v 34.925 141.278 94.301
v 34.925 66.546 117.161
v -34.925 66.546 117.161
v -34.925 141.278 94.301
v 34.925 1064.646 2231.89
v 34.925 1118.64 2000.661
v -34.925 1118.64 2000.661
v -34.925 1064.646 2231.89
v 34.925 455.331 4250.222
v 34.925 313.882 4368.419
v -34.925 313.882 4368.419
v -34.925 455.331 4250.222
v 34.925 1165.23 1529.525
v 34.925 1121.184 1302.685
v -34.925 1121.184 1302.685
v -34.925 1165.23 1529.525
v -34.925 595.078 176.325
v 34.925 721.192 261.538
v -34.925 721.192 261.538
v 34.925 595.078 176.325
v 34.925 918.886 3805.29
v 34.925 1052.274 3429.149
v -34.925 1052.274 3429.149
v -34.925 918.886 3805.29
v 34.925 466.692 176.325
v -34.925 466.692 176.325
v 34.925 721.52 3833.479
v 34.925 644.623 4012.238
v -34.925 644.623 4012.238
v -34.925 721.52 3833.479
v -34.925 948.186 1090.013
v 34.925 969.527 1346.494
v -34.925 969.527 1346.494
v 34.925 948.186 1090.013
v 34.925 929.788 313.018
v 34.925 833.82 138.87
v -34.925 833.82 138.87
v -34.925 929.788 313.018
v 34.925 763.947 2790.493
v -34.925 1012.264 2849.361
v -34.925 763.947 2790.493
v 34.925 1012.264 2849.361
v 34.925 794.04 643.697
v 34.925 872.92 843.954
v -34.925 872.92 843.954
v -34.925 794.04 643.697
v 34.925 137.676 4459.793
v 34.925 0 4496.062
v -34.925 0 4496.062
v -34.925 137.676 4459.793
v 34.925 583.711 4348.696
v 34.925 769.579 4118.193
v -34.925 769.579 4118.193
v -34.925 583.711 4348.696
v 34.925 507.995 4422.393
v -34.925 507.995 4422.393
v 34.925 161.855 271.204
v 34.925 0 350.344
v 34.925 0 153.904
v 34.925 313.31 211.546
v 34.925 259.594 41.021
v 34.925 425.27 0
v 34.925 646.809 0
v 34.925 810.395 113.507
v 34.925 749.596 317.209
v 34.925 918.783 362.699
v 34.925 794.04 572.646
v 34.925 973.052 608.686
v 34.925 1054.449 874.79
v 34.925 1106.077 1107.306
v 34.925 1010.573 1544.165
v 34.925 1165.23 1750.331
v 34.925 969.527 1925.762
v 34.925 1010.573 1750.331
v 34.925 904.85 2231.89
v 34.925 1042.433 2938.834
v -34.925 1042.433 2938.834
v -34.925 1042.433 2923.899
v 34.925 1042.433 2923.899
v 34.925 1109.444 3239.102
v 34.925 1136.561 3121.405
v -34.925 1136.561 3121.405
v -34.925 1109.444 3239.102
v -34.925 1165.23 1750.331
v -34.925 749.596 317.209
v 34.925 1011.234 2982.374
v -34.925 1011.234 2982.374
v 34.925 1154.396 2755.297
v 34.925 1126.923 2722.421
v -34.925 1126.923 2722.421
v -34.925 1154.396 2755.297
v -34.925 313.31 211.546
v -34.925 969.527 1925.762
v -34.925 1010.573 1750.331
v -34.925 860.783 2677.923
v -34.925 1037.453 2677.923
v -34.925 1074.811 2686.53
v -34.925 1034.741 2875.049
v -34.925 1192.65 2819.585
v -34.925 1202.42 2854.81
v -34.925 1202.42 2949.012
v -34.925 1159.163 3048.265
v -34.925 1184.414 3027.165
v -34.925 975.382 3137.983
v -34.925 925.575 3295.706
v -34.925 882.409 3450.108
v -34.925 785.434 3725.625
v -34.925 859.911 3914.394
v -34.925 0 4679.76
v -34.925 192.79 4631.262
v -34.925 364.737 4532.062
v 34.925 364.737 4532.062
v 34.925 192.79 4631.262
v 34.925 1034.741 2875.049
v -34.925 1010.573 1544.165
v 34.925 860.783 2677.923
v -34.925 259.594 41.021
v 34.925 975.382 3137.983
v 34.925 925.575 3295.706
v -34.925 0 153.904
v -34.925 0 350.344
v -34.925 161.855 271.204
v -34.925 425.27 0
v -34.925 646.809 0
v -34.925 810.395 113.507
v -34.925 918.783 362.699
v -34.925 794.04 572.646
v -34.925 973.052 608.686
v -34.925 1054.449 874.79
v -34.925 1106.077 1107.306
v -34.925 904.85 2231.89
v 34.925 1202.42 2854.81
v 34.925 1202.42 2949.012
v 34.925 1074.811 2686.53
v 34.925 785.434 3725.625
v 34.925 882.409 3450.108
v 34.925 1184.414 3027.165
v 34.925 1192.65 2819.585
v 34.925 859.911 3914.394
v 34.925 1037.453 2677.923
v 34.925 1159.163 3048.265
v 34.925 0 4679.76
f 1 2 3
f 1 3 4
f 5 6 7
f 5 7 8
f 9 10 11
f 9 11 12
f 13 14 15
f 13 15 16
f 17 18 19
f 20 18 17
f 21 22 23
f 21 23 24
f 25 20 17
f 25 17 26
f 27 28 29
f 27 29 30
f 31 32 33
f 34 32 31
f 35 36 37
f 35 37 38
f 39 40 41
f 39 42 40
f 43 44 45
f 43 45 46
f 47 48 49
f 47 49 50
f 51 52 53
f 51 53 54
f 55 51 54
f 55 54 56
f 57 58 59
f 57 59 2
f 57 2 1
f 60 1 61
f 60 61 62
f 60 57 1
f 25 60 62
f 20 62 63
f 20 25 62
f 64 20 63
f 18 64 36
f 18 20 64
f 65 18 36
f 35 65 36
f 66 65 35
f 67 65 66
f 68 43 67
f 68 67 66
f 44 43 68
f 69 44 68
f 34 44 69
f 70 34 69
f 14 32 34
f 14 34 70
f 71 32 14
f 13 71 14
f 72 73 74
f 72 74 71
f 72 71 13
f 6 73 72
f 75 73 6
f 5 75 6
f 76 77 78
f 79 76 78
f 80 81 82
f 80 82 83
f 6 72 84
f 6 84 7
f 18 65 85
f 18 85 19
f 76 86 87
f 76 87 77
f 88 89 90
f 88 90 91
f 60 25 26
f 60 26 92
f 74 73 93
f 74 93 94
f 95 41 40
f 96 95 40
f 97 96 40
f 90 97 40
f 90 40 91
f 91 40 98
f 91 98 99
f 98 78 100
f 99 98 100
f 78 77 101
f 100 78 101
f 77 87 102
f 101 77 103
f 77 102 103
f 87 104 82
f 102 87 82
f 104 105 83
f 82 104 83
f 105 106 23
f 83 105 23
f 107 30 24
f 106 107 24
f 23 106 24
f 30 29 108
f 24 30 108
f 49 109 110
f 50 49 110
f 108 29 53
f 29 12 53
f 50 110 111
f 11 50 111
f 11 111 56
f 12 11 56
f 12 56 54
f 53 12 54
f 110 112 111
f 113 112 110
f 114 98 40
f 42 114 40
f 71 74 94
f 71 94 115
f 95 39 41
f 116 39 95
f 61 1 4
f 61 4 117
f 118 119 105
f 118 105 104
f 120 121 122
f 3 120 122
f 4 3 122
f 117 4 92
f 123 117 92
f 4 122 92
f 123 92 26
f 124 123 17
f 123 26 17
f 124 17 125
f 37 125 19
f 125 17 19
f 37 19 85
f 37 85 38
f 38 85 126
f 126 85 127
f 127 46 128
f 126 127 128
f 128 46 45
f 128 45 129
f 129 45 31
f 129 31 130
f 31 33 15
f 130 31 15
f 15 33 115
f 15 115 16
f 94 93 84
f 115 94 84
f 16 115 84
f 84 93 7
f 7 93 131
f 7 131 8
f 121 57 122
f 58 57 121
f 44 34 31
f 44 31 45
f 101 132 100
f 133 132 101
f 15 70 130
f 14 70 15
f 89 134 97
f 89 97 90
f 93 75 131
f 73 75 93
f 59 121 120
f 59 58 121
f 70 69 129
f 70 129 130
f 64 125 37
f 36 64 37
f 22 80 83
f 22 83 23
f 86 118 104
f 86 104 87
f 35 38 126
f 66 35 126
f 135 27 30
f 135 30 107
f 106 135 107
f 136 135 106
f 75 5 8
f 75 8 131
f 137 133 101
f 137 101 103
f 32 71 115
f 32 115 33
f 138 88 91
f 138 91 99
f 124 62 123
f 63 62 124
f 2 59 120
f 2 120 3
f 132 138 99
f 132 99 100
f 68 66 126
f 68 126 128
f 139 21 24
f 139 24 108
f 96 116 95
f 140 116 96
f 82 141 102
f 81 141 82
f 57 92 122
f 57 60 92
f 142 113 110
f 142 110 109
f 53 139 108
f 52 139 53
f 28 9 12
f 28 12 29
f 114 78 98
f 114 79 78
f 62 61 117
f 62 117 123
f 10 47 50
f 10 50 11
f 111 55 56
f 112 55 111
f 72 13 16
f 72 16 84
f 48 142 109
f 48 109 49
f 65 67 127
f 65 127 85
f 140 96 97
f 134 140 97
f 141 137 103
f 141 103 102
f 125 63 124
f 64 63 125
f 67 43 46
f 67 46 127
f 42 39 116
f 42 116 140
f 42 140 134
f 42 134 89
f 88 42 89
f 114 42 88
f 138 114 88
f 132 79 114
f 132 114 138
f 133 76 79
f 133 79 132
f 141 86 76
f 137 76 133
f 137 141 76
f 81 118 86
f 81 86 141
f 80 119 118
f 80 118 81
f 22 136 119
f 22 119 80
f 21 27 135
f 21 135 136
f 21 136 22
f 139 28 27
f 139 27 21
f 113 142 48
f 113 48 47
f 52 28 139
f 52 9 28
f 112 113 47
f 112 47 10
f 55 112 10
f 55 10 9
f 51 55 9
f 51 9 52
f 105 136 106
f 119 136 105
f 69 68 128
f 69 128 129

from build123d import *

# Parameters (mm, degrees)
F1_DEPTH = 34.925


with BuildPart() as f1:
    # F0 (on Right) → F1 (new body, symmetric)
    with BuildSketch(Plane.YZ):
        Polygon((0, 350.3441957332), (0, 153.9044350681), (66.545981199, 117.1606754217), (141.2781657966, 94.3013869244), (259.5944866446, 41.0210398331), (425.2699246819, 0), (646.8094668392, 0), (810.3947972327, 113.5070205467), (833.8203634852, 138.8704849541), (929.787701284, 313.018094407), (918.7828775607, 362.6985941281), (973.0521689621, 608.6856846322), (1054.4487625531, 874.7895600253), (1106.0773858303, 1107.3055545564), (1121.18357592, 1302.6851334089), (1165.2301725068, 1529.5247187173), (1165.2301725068, 1750.3313428338), (1118.6396285553, 2000.6609793652), (1064.646047002, 2231.8904325191), (904.8504565538, 2231.8904325191), (969.5265388502, 1925.7624502381), (1010.5726996796, 1750.3313428338), (1010.5726996796, 1544.1645388312), (969.5265388502, 1346.4944701282), (948.1857828979, 1090.0133952791), (872.9204127305, 843.9538760676), (794.0403696346, 643.6968190836), (794.0403696346, 572.6459441288), (749.5960138581, 317.2094646777), (721.1919633948, 261.5375675371), (595.078105659, 176.3254925512), (466.691891287, 176.3254925512), (313.3101614059, 211.5464855828), (161.8546271347, 271.2039206358), align=None)
    extrude(amount=F1_DEPTH, both=True)


with BuildPart() as f1b:
    # F0 (on Right) → F1, piece 2 (new body, symmetric)
    with BuildSketch(Plane.YZ):
        Polygon((1012.2641822218, 2849.3614280556), (763.9474853009, 2790.4932717226), (860.7825687209, 2677.9225811069), (1037.452554841, 2677.9225811069), (1074.8111399017, 2686.5298485251), (1126.9234179405, 2722.4205471477), (1154.3956787528, 2755.2971099888), (1192.649630175, 2819.5854674866), (1202.4199508907, 2854.8101533779), (1202.4199508907, 2949.0123053893), (1184.4139343749, 3027.1647859531), (1159.1630841978, 3048.2648609564), (1136.560947524, 3121.4047414268), (1109.444051396, 3239.1016621045), (1052.2738974126, 3429.1489553207), (918.8863795038, 3805.290093518), (859.911461324, 3914.3937736483), (769.5786124235, 4118.193174447), (583.7114835589, 4348.6956690716), (507.9947695343, 4422.3927199343), (364.7368998644, 4532.0619933598), (192.7900055698, 4631.2620859919), (0, 4679.7600811069), (0, 4496.0624691033), (137.6759594531, 4459.792780326), (313.8824018485, 4368.4189015473), (455.3306684024, 4250.2221274809), (644.6233448437, 4012.2381538213), (721.5196855906, 3833.4792959519), (785.4335107126, 3725.6245664339), (882.4089737365, 3450.1076913059), (925.5751925752, 3295.7056115608), (975.3823446493, 3137.9831161338), (1011.2339507746, 2982.3744645247), (1042.4333686769, 2938.8335605023), (1042.4333686769, 2923.8987191018), (1034.7411164921, 2875.0494693611), align=None)
    extrude(amount=F1_DEPTH, both=True)


solid = Compound([f1.part, f1b.part])
